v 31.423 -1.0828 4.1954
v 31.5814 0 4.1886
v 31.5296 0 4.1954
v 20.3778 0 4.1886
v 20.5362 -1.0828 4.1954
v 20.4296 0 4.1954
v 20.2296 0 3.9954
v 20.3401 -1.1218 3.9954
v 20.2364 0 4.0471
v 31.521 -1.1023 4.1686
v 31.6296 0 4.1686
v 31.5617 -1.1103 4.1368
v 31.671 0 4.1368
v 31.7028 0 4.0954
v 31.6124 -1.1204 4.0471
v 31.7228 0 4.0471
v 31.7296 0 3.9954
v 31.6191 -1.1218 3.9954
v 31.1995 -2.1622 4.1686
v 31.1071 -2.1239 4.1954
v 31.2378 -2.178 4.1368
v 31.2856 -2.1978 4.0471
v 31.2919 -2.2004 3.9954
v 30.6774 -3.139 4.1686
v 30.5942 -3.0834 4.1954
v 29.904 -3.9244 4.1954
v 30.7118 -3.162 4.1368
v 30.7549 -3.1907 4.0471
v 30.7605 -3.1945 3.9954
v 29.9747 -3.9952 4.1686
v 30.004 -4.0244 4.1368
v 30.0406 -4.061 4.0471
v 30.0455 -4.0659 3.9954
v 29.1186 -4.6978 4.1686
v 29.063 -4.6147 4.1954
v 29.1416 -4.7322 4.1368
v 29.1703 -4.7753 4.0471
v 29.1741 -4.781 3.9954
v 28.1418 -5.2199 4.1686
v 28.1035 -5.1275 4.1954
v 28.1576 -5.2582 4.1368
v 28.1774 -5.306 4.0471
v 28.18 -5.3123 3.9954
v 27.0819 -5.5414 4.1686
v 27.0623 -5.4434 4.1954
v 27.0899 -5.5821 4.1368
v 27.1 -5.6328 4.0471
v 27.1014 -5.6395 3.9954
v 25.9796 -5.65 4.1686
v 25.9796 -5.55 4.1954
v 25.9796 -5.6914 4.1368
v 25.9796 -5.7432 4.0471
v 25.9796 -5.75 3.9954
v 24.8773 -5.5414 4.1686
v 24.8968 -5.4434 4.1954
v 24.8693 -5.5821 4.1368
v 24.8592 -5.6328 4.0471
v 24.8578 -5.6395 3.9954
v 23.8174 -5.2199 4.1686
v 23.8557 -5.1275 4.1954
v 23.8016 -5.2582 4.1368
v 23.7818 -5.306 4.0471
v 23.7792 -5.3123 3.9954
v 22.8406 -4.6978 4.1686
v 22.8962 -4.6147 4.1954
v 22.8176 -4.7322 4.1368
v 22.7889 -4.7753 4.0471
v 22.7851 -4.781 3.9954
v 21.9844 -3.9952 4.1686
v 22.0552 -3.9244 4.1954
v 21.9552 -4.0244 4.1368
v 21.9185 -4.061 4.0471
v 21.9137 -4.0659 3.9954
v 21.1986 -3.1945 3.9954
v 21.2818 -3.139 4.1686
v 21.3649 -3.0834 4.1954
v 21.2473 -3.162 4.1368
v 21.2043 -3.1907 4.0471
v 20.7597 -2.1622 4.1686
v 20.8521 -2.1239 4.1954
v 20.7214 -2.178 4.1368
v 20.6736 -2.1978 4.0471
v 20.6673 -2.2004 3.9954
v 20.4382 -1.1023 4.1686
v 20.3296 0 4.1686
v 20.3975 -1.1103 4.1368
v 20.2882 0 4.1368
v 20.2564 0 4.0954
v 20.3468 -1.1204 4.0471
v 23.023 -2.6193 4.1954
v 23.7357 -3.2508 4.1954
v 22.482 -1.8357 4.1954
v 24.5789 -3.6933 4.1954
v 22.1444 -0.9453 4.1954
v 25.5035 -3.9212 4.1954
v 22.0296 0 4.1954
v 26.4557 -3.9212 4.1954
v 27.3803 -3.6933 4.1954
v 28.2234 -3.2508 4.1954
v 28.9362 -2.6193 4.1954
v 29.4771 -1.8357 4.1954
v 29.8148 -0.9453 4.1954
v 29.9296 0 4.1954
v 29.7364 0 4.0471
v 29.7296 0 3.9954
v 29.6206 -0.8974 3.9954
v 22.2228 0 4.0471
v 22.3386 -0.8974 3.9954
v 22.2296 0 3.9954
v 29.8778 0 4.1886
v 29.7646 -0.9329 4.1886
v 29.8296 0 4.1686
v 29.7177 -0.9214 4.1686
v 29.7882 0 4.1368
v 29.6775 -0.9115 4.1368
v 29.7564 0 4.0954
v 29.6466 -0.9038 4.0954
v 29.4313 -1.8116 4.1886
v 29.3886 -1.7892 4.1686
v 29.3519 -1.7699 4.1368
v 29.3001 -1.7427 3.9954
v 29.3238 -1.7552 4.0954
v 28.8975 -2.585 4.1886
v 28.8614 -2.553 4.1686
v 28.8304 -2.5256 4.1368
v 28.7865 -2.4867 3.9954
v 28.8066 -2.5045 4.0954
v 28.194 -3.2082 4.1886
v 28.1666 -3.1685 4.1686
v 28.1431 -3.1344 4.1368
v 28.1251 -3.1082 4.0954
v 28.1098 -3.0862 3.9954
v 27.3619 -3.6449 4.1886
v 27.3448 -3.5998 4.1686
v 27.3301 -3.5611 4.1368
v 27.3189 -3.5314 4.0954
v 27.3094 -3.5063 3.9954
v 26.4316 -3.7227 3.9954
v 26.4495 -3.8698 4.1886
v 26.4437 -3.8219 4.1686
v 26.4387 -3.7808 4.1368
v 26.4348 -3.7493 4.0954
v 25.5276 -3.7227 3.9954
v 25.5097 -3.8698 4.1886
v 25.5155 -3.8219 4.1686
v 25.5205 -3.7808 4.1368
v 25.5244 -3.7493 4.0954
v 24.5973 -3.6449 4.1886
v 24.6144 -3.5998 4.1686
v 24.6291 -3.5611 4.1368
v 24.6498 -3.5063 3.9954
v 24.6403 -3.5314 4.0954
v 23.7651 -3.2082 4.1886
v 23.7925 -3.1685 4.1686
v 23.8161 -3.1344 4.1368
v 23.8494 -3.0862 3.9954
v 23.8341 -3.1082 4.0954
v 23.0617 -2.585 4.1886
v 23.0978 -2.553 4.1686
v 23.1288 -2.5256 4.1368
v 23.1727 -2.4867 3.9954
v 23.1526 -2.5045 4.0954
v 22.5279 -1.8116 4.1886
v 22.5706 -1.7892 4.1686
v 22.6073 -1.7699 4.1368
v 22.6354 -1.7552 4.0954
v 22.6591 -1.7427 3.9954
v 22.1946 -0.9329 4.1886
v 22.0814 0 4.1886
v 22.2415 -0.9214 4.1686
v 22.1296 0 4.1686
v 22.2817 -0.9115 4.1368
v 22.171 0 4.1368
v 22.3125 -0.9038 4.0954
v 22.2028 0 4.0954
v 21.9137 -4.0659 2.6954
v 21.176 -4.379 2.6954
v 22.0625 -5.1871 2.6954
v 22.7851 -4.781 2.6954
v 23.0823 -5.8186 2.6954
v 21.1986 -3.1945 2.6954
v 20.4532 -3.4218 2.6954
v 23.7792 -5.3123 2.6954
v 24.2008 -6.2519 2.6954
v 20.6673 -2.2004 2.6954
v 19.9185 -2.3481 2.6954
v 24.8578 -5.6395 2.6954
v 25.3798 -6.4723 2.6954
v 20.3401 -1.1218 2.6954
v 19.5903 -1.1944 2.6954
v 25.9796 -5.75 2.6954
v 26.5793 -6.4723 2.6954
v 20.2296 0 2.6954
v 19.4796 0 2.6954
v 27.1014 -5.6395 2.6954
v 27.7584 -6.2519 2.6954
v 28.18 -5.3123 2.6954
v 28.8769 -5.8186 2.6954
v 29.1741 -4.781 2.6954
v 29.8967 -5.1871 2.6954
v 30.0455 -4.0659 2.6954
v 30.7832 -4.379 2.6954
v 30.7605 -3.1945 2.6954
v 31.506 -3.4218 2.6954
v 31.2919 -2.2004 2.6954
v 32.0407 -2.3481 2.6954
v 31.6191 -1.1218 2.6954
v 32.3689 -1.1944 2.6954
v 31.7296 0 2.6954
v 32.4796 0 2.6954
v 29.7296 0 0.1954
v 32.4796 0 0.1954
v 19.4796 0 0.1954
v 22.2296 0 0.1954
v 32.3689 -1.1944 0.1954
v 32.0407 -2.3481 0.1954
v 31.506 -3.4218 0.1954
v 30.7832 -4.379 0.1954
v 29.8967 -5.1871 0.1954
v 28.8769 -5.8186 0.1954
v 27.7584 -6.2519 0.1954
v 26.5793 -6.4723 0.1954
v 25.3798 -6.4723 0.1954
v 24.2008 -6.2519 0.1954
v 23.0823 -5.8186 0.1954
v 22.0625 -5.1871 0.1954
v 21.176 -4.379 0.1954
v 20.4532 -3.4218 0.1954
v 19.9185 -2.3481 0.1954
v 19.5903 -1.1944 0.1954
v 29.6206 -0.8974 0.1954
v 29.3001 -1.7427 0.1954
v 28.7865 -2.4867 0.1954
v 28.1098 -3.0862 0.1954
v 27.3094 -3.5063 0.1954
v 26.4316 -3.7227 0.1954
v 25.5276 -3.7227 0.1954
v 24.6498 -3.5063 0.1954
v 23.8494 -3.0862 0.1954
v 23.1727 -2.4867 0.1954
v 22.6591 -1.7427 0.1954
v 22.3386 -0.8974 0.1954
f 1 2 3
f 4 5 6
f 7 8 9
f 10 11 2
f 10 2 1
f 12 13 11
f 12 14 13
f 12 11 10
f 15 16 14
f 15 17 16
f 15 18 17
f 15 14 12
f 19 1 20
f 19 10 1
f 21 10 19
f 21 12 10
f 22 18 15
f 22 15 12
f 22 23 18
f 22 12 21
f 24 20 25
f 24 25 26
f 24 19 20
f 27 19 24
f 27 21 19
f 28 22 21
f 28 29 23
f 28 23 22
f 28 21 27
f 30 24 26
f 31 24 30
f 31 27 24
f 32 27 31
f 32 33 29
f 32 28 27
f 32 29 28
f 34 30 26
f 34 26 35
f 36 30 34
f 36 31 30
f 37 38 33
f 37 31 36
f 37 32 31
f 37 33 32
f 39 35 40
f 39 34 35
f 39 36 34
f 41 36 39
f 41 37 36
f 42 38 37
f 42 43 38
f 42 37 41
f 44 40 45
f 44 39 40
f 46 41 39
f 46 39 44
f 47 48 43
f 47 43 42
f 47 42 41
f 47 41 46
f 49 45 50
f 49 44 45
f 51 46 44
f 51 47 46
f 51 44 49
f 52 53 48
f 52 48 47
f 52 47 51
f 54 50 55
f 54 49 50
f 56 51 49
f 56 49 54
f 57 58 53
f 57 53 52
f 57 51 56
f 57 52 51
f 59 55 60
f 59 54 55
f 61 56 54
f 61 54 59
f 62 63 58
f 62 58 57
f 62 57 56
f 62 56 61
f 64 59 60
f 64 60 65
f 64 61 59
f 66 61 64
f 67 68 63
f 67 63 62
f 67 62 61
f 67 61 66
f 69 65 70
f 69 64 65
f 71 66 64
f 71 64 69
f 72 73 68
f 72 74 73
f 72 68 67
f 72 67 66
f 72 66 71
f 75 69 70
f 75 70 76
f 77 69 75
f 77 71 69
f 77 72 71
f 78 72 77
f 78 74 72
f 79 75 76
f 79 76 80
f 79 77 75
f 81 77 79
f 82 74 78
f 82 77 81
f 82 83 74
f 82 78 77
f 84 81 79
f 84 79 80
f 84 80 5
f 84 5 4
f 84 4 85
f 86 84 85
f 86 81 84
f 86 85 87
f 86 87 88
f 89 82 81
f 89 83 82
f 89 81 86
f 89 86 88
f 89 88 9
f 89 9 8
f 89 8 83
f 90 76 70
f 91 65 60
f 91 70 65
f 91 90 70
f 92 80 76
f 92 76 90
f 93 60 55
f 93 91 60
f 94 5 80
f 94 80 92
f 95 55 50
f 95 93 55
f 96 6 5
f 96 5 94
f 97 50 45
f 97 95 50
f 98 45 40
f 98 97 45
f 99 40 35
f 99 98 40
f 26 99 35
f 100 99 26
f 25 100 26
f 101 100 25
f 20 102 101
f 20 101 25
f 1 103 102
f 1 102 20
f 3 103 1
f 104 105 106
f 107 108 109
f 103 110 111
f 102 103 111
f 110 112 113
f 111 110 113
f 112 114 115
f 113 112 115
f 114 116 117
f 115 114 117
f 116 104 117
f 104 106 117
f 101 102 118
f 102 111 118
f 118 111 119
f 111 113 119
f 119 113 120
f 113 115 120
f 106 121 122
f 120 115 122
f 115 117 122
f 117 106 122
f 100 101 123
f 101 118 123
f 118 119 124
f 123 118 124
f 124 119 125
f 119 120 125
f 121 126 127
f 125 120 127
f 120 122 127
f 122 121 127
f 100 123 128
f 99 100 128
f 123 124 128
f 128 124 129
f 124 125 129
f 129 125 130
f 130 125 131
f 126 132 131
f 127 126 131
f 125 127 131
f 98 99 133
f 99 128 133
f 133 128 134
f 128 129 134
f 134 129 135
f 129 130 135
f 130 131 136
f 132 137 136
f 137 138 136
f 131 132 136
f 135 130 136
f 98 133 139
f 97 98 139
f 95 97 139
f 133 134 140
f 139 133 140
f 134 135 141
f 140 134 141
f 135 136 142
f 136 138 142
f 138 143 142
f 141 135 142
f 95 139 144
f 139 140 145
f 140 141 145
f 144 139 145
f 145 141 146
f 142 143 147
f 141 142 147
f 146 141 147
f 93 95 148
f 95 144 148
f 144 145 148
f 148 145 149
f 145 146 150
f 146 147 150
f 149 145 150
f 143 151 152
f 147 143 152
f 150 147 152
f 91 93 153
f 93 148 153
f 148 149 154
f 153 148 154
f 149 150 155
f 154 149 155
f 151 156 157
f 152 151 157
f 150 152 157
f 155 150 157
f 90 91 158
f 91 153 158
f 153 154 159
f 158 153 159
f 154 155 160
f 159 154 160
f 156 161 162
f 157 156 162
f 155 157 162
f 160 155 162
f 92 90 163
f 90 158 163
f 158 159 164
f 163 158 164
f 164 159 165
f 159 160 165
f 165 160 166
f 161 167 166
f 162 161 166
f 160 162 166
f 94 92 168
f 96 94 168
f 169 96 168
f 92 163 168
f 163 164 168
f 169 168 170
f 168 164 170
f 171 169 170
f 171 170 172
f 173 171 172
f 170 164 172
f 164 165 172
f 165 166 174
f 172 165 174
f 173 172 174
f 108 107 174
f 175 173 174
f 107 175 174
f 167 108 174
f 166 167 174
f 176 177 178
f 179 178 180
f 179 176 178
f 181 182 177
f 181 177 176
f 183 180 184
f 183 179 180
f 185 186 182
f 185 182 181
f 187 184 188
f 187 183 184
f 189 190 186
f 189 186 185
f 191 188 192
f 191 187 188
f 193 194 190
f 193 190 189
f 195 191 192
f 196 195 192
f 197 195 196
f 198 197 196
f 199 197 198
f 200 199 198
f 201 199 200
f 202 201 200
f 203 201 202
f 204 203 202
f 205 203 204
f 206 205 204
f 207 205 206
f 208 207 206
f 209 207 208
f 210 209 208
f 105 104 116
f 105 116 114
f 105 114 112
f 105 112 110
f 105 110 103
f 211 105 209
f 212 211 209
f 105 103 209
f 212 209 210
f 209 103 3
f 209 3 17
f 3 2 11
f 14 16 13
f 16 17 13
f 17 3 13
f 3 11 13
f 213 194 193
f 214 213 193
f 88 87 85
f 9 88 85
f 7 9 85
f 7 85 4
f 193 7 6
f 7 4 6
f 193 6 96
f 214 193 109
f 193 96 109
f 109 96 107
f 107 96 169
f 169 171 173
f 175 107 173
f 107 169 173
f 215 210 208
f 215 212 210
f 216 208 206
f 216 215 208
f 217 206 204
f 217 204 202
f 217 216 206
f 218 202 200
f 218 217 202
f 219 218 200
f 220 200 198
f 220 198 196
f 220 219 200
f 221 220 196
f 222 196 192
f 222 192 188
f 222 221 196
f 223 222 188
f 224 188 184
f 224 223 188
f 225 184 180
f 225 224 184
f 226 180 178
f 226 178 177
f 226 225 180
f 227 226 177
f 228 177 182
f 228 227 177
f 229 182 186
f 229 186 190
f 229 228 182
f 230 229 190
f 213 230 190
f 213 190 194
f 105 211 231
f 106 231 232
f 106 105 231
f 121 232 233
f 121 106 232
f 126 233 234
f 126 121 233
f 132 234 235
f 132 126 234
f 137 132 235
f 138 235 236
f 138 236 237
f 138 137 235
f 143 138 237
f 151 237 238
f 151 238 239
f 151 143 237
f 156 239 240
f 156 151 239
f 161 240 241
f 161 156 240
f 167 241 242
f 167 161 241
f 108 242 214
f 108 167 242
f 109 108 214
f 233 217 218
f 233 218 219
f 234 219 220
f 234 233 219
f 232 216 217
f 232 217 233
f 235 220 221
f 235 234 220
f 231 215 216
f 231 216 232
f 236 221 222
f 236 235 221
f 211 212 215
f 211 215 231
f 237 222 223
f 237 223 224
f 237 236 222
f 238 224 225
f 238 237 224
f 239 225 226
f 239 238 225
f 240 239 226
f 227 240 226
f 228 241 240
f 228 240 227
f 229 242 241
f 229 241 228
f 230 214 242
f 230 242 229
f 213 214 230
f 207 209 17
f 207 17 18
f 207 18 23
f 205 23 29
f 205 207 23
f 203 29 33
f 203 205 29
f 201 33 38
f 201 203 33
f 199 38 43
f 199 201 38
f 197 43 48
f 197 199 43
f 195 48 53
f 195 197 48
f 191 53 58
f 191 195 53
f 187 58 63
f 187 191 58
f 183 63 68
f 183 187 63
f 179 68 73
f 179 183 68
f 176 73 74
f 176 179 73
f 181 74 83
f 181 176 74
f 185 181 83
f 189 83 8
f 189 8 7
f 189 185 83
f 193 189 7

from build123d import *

# Parameters (mm, degrees)
F2_W     = 32.4015552178
F2_H     = 32.2648398578
F3_DEPTH = 25
F4_R     = 0.2


with BuildPart() as f1:
    # F0 (on Front) → F1 (revolve)
    with BuildSketch(Plane.XZ):
        Polygon((22.2295931596, 4.1953726299), (20.2295931596, 4.1953726299), (20.2295931596, 2.6953726299), (19.4795931596, 2.6953726299), (19.4795931596, 0.1953726299), (22.2295931596, 0.1953726299), align=None)
    revolve(axis=Axis((25.9795931596, 0, 0.8535729721), (0, 0, -1)))

    # F2 (on Front) → F3 (cut)
    with BuildSketch(Plane.XZ):
        with Locations((27.7060153894, 1.3981740922)):
            Rectangle(F2_W, F2_H)
    extrude(amount=-F3_DEPTH, mode=Mode.SUBTRACT)

    # F4
    f4_edges = [f1.edges().sort_by_distance(p)[0] for p in [
        (25.979593, -5.75, 4.195373),
        (25.979593, -3.75, 4.195373),
    ]]
    fillet(f4_edges, radius=F4_R)


solid = f1.part
